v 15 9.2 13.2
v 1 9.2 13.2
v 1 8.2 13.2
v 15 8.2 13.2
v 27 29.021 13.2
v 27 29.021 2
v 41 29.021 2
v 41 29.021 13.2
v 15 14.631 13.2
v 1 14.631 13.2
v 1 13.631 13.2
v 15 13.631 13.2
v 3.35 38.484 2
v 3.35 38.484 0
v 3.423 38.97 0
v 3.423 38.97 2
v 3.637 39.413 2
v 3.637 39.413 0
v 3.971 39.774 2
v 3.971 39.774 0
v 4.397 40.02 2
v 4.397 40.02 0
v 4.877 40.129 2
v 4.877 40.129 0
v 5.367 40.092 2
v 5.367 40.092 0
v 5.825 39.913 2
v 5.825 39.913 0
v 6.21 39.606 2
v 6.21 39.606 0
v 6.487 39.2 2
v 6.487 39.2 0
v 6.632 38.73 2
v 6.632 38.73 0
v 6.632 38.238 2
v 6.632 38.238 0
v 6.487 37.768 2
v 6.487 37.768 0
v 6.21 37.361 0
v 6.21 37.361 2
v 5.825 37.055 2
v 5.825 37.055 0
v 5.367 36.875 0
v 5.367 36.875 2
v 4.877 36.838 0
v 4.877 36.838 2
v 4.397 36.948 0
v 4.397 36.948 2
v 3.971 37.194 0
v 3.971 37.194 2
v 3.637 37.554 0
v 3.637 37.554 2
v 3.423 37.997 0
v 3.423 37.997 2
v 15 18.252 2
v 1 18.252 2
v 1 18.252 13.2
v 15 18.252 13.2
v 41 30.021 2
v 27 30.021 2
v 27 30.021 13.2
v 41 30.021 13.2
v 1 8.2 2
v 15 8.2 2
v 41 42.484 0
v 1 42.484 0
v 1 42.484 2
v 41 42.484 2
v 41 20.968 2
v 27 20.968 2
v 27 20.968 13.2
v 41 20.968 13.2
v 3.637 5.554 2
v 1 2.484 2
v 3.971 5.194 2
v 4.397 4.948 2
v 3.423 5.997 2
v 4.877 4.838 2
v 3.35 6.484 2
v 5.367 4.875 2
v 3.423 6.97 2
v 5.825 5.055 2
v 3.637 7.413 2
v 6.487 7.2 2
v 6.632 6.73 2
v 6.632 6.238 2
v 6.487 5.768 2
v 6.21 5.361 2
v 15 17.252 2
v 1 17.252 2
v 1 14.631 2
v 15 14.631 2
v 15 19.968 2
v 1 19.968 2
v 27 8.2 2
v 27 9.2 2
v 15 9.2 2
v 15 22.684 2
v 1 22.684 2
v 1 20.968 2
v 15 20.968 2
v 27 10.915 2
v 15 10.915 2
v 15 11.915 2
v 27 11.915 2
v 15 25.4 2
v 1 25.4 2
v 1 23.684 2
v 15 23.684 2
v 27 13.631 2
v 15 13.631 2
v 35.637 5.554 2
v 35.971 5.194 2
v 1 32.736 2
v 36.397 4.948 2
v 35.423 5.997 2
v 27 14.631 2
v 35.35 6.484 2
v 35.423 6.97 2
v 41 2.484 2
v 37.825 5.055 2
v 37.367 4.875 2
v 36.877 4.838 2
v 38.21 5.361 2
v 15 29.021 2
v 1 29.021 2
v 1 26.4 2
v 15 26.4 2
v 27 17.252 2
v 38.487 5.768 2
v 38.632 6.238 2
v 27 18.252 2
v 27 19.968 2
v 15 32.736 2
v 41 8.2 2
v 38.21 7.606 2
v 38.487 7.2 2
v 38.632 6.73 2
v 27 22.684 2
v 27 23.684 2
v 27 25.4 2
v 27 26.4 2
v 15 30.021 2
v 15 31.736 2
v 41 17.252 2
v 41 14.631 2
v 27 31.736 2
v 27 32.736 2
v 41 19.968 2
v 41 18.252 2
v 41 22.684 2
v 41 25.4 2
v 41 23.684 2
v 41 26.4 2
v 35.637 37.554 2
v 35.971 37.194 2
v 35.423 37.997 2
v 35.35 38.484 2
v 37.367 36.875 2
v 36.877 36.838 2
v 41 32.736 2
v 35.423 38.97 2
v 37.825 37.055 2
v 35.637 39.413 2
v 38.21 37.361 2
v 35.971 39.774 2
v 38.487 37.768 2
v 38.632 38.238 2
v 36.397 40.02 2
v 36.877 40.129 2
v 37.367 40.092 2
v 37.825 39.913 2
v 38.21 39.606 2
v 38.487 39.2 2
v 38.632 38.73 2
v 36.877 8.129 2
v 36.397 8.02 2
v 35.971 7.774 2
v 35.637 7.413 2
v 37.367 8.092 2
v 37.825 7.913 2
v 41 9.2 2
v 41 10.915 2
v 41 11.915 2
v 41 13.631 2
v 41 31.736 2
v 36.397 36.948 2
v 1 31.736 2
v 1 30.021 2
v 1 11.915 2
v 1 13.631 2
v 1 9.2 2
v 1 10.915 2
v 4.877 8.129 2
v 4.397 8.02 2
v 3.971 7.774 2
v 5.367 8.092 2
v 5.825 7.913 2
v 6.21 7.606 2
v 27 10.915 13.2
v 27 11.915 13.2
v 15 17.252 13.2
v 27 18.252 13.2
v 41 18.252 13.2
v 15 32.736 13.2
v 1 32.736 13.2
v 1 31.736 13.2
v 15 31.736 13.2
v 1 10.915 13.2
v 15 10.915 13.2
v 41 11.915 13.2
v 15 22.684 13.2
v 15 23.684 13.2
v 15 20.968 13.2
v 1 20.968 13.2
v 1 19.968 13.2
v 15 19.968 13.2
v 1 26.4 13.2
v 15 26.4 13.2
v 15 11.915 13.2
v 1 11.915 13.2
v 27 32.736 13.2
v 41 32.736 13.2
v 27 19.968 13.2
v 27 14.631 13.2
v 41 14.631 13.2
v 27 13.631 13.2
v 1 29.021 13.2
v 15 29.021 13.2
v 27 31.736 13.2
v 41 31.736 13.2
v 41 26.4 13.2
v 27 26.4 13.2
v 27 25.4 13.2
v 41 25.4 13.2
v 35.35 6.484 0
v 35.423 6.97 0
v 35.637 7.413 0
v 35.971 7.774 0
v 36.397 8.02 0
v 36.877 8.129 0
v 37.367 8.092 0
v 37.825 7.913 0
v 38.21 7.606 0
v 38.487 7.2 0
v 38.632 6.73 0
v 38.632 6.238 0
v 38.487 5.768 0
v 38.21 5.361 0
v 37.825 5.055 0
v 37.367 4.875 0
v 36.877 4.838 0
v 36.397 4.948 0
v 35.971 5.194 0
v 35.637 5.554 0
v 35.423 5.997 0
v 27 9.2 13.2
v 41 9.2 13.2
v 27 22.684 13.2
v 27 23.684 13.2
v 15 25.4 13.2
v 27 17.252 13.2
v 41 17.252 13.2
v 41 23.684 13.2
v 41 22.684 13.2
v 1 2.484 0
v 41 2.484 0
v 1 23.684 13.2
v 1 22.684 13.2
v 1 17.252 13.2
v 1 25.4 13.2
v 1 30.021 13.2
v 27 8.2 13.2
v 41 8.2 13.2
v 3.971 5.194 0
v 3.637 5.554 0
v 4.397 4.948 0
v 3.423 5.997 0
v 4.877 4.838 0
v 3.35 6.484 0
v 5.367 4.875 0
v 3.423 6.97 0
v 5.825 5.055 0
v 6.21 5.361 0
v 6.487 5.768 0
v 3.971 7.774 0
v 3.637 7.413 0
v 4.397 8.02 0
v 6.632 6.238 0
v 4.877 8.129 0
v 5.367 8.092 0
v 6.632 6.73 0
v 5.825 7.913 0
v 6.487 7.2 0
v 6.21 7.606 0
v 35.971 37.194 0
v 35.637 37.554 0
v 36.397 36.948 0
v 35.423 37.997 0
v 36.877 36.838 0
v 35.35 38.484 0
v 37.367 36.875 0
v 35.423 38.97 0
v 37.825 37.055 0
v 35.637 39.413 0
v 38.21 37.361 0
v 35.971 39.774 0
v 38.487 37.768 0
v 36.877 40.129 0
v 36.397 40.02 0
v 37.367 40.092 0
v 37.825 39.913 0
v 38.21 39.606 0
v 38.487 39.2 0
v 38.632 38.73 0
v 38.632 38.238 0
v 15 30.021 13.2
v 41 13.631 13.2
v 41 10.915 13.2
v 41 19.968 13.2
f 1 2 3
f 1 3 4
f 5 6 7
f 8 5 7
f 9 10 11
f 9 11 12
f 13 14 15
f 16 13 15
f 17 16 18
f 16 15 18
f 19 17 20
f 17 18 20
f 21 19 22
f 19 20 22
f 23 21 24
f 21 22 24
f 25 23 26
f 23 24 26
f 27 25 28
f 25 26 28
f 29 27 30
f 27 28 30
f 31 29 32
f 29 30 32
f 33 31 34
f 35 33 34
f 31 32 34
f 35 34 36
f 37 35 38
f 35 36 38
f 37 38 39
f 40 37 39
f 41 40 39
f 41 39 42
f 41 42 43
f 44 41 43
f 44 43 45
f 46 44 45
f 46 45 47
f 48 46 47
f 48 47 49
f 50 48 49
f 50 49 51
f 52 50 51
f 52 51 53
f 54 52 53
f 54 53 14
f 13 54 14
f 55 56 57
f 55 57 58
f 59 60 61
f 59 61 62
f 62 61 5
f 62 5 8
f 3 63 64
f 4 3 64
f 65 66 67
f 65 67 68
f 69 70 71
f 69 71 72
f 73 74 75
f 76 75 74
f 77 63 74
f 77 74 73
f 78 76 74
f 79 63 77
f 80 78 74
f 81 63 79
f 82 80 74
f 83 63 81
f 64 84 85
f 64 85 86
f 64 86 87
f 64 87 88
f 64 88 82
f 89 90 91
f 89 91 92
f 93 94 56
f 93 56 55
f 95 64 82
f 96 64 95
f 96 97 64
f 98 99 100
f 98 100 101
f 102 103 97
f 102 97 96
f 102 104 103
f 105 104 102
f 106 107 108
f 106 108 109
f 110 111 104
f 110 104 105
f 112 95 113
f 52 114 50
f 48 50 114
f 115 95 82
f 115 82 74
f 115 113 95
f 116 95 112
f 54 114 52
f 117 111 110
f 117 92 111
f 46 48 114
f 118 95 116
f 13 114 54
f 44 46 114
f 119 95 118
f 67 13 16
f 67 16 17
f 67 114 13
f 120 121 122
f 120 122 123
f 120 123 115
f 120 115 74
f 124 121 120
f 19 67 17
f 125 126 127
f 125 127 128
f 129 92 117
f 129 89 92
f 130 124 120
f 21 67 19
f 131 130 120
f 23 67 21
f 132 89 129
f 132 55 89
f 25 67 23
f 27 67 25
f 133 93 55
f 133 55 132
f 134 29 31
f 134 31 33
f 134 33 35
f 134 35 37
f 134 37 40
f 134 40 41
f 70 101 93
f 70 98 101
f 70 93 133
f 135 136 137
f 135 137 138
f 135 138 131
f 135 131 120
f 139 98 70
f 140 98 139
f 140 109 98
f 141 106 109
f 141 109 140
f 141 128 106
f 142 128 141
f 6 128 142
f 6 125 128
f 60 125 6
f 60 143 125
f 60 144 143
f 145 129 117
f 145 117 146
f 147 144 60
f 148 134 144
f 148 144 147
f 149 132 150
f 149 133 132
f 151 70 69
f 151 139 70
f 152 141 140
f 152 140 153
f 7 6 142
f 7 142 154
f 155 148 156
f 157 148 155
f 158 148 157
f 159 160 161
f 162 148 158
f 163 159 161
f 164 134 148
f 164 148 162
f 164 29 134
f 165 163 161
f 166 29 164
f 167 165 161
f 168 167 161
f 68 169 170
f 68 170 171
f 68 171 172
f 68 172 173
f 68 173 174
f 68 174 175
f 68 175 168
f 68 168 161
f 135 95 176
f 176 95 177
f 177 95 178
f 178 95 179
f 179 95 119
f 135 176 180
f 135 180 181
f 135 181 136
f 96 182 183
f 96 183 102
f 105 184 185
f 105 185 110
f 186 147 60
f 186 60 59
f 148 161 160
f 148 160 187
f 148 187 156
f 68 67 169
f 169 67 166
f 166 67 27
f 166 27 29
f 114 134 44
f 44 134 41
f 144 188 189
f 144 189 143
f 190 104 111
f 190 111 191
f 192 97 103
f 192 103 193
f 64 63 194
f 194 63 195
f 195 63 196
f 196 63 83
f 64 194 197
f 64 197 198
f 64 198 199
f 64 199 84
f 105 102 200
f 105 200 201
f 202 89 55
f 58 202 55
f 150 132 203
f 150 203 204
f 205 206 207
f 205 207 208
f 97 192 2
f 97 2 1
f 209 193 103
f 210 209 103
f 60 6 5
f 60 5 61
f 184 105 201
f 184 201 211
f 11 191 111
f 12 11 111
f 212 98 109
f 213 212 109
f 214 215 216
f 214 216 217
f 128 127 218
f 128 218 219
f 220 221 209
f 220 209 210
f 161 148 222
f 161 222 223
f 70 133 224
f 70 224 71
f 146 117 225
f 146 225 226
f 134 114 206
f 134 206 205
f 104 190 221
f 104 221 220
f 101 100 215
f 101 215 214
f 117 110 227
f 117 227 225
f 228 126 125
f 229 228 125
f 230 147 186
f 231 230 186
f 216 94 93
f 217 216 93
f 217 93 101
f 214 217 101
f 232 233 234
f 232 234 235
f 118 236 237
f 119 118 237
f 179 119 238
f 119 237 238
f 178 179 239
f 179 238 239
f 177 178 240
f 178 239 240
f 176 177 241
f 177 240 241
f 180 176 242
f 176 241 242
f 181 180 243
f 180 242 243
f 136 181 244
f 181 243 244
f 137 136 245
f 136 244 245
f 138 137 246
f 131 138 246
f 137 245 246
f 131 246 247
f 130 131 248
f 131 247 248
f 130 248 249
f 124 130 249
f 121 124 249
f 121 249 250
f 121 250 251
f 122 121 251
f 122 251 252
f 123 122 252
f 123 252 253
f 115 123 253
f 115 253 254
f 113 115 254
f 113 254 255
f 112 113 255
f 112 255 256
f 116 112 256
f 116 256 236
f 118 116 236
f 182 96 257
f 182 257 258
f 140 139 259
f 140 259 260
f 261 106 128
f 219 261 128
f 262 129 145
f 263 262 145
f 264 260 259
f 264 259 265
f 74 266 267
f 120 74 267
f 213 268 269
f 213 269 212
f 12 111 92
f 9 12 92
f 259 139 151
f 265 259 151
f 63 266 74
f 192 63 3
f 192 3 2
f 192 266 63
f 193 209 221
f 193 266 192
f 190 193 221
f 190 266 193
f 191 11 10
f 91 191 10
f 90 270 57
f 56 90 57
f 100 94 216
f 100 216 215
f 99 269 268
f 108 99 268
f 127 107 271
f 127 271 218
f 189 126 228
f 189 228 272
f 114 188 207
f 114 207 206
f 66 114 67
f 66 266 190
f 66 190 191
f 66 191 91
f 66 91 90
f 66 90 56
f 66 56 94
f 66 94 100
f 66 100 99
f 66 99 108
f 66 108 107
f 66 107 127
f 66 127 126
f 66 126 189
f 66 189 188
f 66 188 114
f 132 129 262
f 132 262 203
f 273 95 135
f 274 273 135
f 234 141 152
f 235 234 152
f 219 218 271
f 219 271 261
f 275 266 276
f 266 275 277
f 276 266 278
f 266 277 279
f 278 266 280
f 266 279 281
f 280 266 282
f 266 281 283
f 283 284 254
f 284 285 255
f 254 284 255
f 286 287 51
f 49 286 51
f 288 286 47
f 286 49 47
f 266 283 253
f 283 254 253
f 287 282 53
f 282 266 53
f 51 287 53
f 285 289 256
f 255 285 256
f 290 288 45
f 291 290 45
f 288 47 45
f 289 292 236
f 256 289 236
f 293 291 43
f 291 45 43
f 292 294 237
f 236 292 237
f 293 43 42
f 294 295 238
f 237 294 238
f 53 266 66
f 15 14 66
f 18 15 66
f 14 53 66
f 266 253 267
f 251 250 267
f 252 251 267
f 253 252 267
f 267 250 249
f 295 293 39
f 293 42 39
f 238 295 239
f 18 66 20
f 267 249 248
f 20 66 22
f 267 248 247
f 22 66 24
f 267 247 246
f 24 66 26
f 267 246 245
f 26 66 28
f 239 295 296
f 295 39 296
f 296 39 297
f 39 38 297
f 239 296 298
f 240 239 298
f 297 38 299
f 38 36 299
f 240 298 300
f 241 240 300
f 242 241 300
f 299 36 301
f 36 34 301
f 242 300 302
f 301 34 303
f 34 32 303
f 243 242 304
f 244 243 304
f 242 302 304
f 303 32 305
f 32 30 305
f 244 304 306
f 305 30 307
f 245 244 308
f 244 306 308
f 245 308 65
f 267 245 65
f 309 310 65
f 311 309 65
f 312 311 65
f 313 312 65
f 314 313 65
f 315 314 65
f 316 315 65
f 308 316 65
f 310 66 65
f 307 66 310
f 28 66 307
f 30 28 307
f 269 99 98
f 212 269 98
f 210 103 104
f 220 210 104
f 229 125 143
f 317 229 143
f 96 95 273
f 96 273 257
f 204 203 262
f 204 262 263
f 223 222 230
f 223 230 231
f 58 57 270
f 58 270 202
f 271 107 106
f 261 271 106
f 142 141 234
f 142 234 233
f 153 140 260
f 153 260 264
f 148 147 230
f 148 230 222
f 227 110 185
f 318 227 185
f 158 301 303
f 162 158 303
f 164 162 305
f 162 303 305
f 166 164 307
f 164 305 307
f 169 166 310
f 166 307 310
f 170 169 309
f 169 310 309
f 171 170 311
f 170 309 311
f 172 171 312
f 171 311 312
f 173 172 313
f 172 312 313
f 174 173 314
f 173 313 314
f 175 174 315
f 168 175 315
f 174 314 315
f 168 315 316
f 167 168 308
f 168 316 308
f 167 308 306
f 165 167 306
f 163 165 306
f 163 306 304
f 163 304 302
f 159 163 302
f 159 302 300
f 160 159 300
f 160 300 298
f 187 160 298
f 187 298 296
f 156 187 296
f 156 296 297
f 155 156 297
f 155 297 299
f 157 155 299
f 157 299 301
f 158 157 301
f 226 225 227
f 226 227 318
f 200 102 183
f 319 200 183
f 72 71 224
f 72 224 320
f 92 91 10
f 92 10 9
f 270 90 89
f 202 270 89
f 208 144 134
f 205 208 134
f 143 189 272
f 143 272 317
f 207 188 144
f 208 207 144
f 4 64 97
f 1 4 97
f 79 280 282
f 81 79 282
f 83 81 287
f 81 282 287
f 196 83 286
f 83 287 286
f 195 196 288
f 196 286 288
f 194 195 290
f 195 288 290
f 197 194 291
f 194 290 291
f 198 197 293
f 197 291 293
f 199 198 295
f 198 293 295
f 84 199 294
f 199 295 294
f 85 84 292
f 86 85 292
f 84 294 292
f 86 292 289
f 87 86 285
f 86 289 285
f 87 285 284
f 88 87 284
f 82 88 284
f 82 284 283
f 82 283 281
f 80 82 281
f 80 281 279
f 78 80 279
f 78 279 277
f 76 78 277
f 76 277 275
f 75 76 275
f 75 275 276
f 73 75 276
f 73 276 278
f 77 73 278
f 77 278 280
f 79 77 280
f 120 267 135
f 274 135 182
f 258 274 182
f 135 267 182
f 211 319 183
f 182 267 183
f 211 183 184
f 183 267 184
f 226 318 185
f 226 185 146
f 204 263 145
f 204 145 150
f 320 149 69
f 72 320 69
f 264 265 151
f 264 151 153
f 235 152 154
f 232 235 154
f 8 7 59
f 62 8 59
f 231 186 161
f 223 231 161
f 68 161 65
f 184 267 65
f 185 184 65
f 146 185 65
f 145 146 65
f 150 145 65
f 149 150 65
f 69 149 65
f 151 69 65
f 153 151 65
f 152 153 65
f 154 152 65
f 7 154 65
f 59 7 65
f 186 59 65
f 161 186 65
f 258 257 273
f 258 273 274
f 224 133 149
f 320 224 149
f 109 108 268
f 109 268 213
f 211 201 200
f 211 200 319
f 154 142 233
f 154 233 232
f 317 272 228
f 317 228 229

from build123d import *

# Parameters (mm, degrees)
SKETCH1_W            = 40
SKETCH1_H            = 40
BOSS_EXTRUDE1_DEPTH  = 2
EXTRUDE_THIN1_START  = 2
SKETCH1_3_W          = 14
SKETCH1_3_H          = 1
EXTRUDE_THIN1_DEPTH  = 11.2
SKETCH3_R            = 1.65
CUT_EXTRUDE1_DEPTH   = 13.2
LPATTERN1_COUNT      = 2
LPATTERN1_PITCH      = 32
LPATTERN1_COUNT_DIR2 = 2
LPATTERN1_PITCH_DIR2 = 32


with BuildPart() as part:
    # Sketch1 → Boss-Extrude1 (new body)
    with BuildSketch(Plane.XY):
        with Locations((21, 22.483732861)):
            Rectangle(SKETCH1_W, SKETCH1_H)
    extrude(amount=BOSS_EXTRUDE1_DEPTH)

    # Sketch1<3> → Extrude-Thin1 (add)
    with BuildSketch(Plane.XY.offset(EXTRUDE_THIN1_START)):
        with Locations((34, 8.699522335)):
            Rectangle(SKETCH1_3_W, SKETCH1_3_H)
        with Locations((34, 11.415311808)):
            Rectangle(SKETCH1_3_W, SKETCH1_3_H)
        with Locations((34, 14.131101282)):
            Rectangle(SKETCH1_3_W, SKETCH1_3_H)
        with Locations((34, 17.752153914)):
            Rectangle(SKETCH1_3_W, SKETCH1_3_H)
        with Locations((34, 20.467943387)):
            Rectangle(SKETCH1_3_W, SKETCH1_3_H)
        with Locations((34, 23.183732861)):
            Rectangle(SKETCH1_3_W, SKETCH1_3_H)
        with Locations((34, 25.899522335)):
            Rectangle(SKETCH1_3_W, SKETCH1_3_H)
        with Locations((34, 29.520574966)):
            Rectangle(SKETCH1_3_W, SKETCH1_3_H)
        with Locations((34, 32.23636444)):
            Rectangle(SKETCH1_3_W, SKETCH1_3_H)
        with Locations((8, 8.699522335)):
            Rectangle(SKETCH1_3_W, SKETCH1_3_H)
        with Locations((8, 11.415311808)):
            Rectangle(SKETCH1_3_W, SKETCH1_3_H)
        with Locations((8, 14.131101282)):
            Rectangle(SKETCH1_3_W, SKETCH1_3_H)
        with Locations((8, 17.752153914)):
            Rectangle(SKETCH1_3_W, SKETCH1_3_H)
        with Locations((8, 20.467943387)):
            Rectangle(SKETCH1_3_W, SKETCH1_3_H)
        with Locations((8, 23.183732861)):
            Rectangle(SKETCH1_3_W, SKETCH1_3_H)
        with Locations((8, 25.899522335)):
            Rectangle(SKETCH1_3_W, SKETCH1_3_H)
        with Locations((8, 29.520574966)):
            Rectangle(SKETCH1_3_W, SKETCH1_3_H)
        with Locations((8, 32.23636444)):
            Rectangle(SKETCH1_3_W, SKETCH1_3_H)
    extrude(amount=EXTRUDE_THIN1_DEPTH)

    # Sketch3 → Cut-Extrude1 (cut)
    with BuildSketch(Plane(origin=(0, 0, 0), x_dir=(-1, 0, 0), z_dir=(0, 0, -1))):
        with Locations((-37, 6.483732861)):
            Circle(SKETCH3_R)
    cut_extrude1 = extrude(amount=-CUT_EXTRUDE1_DEPTH, mode=Mode.SUBTRACT)

    # LPattern1: Cut-Extrude1 2 × 2
    with Locations(*[(-i * LPATTERN1_PITCH, j * LPATTERN1_PITCH_DIR2, 0) for i in range(LPATTERN1_COUNT) for j in range(LPATTERN1_COUNT_DIR2) if (i, j) != (0, 0)]):
        add(cut_extrude1, mode=Mode.SUBTRACT)


solid = part.part
